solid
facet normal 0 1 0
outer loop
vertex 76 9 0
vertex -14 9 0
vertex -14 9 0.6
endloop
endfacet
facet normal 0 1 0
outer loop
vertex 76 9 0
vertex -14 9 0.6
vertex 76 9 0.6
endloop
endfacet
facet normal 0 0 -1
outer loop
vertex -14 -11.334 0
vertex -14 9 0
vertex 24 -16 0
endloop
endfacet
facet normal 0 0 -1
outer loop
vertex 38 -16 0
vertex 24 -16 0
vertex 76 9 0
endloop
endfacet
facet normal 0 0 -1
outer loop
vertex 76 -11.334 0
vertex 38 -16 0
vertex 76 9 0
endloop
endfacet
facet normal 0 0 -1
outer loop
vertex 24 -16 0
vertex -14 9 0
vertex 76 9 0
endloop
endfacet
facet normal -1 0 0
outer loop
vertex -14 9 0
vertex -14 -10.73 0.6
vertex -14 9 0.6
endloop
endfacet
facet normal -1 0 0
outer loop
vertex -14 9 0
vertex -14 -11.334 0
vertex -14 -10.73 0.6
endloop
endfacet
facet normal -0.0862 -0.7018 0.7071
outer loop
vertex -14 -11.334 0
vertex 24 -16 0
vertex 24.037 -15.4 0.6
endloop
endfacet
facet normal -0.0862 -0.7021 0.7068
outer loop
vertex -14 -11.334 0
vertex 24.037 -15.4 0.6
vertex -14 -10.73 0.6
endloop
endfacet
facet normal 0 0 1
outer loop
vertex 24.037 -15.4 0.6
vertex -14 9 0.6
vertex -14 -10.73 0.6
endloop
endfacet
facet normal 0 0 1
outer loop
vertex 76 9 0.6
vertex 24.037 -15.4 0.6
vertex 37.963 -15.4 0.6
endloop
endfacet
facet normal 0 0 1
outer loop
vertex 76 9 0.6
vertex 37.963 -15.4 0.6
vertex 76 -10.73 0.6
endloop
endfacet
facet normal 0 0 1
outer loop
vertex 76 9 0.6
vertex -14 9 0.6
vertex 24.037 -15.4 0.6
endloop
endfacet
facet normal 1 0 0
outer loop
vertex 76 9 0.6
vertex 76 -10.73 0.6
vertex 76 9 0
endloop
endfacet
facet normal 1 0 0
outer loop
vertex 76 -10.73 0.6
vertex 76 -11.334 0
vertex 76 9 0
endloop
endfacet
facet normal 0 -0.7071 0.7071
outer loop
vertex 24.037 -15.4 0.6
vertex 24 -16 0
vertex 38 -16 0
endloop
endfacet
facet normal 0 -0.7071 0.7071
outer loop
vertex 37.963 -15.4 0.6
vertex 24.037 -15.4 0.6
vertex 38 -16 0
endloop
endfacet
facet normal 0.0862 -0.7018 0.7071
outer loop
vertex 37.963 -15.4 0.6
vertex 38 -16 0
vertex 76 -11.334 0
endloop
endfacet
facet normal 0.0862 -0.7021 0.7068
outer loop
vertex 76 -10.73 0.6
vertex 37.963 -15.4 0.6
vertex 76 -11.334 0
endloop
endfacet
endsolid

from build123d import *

# Parameters (mm, degrees)
SKETCH_1_W          = 90
SKETCH_1_H          = 25
EXTRUDE_1_DEPTH     = 0.6
CUT_EXTRUDE_1_REACH = 79.668
CHAMFER_1_SIZE      = 0.6


with BuildPart() as part:
    # 草图1 → 凸台-拉伸1 (new body)
    with BuildSketch(Plane.XY):
        with Locations((31, -3.5)):
            Rectangle(SKETCH_1_W, SKETCH_1_H)
    extrude(amount=EXTRUDE_1_DEPTH)

    # 草图2 → 切除-拉伸1 (cut, up to next)
    with BuildSketch(Plane.XY.offset(0.6), mode=Mode.PRIVATE) as cut_extrude_1_sk1:
        Polygon((24, -16), (-14, -11.334186686), (-14, -16), align=None)
    cut_extrude_1_tool1 = extrude(cut_extrude_1_sk1.sketch, amount=-CUT_EXTRUDE_1_REACH, mode=Mode.PRIVATE) & part.part
    # 草图2 → 切除-拉伸1 (cut, up to next)
    with BuildSketch(Plane.XY.offset(0.6), mode=Mode.PRIVATE) as cut_extrude_1_sk2:
        Polygon((76, -11.334186686), (76, -16), (38, -16), align=None)
    cut_extrude_1_tool2 = extrude(cut_extrude_1_sk2.sketch, amount=-CUT_EXTRUDE_1_REACH, mode=Mode.PRIVATE) & part.part
    add(cut_extrude_1_tool1.solids().sort_by_distance((-1.333333, -14.444729, 0.6))[0], mode=Mode.SUBTRACT)
    add(cut_extrude_1_tool2.solids().sort_by_distance((63.333333, -14.444729, 0.6))[0], mode=Mode.SUBTRACT)

    # 倒角1
    chamfer_1_edges = [part.edges().sort_by_distance(p)[0] for p in [
        (57, -13.667093343, 0.6),
        (5, -13.667093343, 0.6),
        (31, -16, 0.6),
    ]]
    chamfer(chamfer_1_edges, length=CHAMFER_1_SIZE - 0.0001)  # a hair under: the kernel refuses the full size


solid = part.part
